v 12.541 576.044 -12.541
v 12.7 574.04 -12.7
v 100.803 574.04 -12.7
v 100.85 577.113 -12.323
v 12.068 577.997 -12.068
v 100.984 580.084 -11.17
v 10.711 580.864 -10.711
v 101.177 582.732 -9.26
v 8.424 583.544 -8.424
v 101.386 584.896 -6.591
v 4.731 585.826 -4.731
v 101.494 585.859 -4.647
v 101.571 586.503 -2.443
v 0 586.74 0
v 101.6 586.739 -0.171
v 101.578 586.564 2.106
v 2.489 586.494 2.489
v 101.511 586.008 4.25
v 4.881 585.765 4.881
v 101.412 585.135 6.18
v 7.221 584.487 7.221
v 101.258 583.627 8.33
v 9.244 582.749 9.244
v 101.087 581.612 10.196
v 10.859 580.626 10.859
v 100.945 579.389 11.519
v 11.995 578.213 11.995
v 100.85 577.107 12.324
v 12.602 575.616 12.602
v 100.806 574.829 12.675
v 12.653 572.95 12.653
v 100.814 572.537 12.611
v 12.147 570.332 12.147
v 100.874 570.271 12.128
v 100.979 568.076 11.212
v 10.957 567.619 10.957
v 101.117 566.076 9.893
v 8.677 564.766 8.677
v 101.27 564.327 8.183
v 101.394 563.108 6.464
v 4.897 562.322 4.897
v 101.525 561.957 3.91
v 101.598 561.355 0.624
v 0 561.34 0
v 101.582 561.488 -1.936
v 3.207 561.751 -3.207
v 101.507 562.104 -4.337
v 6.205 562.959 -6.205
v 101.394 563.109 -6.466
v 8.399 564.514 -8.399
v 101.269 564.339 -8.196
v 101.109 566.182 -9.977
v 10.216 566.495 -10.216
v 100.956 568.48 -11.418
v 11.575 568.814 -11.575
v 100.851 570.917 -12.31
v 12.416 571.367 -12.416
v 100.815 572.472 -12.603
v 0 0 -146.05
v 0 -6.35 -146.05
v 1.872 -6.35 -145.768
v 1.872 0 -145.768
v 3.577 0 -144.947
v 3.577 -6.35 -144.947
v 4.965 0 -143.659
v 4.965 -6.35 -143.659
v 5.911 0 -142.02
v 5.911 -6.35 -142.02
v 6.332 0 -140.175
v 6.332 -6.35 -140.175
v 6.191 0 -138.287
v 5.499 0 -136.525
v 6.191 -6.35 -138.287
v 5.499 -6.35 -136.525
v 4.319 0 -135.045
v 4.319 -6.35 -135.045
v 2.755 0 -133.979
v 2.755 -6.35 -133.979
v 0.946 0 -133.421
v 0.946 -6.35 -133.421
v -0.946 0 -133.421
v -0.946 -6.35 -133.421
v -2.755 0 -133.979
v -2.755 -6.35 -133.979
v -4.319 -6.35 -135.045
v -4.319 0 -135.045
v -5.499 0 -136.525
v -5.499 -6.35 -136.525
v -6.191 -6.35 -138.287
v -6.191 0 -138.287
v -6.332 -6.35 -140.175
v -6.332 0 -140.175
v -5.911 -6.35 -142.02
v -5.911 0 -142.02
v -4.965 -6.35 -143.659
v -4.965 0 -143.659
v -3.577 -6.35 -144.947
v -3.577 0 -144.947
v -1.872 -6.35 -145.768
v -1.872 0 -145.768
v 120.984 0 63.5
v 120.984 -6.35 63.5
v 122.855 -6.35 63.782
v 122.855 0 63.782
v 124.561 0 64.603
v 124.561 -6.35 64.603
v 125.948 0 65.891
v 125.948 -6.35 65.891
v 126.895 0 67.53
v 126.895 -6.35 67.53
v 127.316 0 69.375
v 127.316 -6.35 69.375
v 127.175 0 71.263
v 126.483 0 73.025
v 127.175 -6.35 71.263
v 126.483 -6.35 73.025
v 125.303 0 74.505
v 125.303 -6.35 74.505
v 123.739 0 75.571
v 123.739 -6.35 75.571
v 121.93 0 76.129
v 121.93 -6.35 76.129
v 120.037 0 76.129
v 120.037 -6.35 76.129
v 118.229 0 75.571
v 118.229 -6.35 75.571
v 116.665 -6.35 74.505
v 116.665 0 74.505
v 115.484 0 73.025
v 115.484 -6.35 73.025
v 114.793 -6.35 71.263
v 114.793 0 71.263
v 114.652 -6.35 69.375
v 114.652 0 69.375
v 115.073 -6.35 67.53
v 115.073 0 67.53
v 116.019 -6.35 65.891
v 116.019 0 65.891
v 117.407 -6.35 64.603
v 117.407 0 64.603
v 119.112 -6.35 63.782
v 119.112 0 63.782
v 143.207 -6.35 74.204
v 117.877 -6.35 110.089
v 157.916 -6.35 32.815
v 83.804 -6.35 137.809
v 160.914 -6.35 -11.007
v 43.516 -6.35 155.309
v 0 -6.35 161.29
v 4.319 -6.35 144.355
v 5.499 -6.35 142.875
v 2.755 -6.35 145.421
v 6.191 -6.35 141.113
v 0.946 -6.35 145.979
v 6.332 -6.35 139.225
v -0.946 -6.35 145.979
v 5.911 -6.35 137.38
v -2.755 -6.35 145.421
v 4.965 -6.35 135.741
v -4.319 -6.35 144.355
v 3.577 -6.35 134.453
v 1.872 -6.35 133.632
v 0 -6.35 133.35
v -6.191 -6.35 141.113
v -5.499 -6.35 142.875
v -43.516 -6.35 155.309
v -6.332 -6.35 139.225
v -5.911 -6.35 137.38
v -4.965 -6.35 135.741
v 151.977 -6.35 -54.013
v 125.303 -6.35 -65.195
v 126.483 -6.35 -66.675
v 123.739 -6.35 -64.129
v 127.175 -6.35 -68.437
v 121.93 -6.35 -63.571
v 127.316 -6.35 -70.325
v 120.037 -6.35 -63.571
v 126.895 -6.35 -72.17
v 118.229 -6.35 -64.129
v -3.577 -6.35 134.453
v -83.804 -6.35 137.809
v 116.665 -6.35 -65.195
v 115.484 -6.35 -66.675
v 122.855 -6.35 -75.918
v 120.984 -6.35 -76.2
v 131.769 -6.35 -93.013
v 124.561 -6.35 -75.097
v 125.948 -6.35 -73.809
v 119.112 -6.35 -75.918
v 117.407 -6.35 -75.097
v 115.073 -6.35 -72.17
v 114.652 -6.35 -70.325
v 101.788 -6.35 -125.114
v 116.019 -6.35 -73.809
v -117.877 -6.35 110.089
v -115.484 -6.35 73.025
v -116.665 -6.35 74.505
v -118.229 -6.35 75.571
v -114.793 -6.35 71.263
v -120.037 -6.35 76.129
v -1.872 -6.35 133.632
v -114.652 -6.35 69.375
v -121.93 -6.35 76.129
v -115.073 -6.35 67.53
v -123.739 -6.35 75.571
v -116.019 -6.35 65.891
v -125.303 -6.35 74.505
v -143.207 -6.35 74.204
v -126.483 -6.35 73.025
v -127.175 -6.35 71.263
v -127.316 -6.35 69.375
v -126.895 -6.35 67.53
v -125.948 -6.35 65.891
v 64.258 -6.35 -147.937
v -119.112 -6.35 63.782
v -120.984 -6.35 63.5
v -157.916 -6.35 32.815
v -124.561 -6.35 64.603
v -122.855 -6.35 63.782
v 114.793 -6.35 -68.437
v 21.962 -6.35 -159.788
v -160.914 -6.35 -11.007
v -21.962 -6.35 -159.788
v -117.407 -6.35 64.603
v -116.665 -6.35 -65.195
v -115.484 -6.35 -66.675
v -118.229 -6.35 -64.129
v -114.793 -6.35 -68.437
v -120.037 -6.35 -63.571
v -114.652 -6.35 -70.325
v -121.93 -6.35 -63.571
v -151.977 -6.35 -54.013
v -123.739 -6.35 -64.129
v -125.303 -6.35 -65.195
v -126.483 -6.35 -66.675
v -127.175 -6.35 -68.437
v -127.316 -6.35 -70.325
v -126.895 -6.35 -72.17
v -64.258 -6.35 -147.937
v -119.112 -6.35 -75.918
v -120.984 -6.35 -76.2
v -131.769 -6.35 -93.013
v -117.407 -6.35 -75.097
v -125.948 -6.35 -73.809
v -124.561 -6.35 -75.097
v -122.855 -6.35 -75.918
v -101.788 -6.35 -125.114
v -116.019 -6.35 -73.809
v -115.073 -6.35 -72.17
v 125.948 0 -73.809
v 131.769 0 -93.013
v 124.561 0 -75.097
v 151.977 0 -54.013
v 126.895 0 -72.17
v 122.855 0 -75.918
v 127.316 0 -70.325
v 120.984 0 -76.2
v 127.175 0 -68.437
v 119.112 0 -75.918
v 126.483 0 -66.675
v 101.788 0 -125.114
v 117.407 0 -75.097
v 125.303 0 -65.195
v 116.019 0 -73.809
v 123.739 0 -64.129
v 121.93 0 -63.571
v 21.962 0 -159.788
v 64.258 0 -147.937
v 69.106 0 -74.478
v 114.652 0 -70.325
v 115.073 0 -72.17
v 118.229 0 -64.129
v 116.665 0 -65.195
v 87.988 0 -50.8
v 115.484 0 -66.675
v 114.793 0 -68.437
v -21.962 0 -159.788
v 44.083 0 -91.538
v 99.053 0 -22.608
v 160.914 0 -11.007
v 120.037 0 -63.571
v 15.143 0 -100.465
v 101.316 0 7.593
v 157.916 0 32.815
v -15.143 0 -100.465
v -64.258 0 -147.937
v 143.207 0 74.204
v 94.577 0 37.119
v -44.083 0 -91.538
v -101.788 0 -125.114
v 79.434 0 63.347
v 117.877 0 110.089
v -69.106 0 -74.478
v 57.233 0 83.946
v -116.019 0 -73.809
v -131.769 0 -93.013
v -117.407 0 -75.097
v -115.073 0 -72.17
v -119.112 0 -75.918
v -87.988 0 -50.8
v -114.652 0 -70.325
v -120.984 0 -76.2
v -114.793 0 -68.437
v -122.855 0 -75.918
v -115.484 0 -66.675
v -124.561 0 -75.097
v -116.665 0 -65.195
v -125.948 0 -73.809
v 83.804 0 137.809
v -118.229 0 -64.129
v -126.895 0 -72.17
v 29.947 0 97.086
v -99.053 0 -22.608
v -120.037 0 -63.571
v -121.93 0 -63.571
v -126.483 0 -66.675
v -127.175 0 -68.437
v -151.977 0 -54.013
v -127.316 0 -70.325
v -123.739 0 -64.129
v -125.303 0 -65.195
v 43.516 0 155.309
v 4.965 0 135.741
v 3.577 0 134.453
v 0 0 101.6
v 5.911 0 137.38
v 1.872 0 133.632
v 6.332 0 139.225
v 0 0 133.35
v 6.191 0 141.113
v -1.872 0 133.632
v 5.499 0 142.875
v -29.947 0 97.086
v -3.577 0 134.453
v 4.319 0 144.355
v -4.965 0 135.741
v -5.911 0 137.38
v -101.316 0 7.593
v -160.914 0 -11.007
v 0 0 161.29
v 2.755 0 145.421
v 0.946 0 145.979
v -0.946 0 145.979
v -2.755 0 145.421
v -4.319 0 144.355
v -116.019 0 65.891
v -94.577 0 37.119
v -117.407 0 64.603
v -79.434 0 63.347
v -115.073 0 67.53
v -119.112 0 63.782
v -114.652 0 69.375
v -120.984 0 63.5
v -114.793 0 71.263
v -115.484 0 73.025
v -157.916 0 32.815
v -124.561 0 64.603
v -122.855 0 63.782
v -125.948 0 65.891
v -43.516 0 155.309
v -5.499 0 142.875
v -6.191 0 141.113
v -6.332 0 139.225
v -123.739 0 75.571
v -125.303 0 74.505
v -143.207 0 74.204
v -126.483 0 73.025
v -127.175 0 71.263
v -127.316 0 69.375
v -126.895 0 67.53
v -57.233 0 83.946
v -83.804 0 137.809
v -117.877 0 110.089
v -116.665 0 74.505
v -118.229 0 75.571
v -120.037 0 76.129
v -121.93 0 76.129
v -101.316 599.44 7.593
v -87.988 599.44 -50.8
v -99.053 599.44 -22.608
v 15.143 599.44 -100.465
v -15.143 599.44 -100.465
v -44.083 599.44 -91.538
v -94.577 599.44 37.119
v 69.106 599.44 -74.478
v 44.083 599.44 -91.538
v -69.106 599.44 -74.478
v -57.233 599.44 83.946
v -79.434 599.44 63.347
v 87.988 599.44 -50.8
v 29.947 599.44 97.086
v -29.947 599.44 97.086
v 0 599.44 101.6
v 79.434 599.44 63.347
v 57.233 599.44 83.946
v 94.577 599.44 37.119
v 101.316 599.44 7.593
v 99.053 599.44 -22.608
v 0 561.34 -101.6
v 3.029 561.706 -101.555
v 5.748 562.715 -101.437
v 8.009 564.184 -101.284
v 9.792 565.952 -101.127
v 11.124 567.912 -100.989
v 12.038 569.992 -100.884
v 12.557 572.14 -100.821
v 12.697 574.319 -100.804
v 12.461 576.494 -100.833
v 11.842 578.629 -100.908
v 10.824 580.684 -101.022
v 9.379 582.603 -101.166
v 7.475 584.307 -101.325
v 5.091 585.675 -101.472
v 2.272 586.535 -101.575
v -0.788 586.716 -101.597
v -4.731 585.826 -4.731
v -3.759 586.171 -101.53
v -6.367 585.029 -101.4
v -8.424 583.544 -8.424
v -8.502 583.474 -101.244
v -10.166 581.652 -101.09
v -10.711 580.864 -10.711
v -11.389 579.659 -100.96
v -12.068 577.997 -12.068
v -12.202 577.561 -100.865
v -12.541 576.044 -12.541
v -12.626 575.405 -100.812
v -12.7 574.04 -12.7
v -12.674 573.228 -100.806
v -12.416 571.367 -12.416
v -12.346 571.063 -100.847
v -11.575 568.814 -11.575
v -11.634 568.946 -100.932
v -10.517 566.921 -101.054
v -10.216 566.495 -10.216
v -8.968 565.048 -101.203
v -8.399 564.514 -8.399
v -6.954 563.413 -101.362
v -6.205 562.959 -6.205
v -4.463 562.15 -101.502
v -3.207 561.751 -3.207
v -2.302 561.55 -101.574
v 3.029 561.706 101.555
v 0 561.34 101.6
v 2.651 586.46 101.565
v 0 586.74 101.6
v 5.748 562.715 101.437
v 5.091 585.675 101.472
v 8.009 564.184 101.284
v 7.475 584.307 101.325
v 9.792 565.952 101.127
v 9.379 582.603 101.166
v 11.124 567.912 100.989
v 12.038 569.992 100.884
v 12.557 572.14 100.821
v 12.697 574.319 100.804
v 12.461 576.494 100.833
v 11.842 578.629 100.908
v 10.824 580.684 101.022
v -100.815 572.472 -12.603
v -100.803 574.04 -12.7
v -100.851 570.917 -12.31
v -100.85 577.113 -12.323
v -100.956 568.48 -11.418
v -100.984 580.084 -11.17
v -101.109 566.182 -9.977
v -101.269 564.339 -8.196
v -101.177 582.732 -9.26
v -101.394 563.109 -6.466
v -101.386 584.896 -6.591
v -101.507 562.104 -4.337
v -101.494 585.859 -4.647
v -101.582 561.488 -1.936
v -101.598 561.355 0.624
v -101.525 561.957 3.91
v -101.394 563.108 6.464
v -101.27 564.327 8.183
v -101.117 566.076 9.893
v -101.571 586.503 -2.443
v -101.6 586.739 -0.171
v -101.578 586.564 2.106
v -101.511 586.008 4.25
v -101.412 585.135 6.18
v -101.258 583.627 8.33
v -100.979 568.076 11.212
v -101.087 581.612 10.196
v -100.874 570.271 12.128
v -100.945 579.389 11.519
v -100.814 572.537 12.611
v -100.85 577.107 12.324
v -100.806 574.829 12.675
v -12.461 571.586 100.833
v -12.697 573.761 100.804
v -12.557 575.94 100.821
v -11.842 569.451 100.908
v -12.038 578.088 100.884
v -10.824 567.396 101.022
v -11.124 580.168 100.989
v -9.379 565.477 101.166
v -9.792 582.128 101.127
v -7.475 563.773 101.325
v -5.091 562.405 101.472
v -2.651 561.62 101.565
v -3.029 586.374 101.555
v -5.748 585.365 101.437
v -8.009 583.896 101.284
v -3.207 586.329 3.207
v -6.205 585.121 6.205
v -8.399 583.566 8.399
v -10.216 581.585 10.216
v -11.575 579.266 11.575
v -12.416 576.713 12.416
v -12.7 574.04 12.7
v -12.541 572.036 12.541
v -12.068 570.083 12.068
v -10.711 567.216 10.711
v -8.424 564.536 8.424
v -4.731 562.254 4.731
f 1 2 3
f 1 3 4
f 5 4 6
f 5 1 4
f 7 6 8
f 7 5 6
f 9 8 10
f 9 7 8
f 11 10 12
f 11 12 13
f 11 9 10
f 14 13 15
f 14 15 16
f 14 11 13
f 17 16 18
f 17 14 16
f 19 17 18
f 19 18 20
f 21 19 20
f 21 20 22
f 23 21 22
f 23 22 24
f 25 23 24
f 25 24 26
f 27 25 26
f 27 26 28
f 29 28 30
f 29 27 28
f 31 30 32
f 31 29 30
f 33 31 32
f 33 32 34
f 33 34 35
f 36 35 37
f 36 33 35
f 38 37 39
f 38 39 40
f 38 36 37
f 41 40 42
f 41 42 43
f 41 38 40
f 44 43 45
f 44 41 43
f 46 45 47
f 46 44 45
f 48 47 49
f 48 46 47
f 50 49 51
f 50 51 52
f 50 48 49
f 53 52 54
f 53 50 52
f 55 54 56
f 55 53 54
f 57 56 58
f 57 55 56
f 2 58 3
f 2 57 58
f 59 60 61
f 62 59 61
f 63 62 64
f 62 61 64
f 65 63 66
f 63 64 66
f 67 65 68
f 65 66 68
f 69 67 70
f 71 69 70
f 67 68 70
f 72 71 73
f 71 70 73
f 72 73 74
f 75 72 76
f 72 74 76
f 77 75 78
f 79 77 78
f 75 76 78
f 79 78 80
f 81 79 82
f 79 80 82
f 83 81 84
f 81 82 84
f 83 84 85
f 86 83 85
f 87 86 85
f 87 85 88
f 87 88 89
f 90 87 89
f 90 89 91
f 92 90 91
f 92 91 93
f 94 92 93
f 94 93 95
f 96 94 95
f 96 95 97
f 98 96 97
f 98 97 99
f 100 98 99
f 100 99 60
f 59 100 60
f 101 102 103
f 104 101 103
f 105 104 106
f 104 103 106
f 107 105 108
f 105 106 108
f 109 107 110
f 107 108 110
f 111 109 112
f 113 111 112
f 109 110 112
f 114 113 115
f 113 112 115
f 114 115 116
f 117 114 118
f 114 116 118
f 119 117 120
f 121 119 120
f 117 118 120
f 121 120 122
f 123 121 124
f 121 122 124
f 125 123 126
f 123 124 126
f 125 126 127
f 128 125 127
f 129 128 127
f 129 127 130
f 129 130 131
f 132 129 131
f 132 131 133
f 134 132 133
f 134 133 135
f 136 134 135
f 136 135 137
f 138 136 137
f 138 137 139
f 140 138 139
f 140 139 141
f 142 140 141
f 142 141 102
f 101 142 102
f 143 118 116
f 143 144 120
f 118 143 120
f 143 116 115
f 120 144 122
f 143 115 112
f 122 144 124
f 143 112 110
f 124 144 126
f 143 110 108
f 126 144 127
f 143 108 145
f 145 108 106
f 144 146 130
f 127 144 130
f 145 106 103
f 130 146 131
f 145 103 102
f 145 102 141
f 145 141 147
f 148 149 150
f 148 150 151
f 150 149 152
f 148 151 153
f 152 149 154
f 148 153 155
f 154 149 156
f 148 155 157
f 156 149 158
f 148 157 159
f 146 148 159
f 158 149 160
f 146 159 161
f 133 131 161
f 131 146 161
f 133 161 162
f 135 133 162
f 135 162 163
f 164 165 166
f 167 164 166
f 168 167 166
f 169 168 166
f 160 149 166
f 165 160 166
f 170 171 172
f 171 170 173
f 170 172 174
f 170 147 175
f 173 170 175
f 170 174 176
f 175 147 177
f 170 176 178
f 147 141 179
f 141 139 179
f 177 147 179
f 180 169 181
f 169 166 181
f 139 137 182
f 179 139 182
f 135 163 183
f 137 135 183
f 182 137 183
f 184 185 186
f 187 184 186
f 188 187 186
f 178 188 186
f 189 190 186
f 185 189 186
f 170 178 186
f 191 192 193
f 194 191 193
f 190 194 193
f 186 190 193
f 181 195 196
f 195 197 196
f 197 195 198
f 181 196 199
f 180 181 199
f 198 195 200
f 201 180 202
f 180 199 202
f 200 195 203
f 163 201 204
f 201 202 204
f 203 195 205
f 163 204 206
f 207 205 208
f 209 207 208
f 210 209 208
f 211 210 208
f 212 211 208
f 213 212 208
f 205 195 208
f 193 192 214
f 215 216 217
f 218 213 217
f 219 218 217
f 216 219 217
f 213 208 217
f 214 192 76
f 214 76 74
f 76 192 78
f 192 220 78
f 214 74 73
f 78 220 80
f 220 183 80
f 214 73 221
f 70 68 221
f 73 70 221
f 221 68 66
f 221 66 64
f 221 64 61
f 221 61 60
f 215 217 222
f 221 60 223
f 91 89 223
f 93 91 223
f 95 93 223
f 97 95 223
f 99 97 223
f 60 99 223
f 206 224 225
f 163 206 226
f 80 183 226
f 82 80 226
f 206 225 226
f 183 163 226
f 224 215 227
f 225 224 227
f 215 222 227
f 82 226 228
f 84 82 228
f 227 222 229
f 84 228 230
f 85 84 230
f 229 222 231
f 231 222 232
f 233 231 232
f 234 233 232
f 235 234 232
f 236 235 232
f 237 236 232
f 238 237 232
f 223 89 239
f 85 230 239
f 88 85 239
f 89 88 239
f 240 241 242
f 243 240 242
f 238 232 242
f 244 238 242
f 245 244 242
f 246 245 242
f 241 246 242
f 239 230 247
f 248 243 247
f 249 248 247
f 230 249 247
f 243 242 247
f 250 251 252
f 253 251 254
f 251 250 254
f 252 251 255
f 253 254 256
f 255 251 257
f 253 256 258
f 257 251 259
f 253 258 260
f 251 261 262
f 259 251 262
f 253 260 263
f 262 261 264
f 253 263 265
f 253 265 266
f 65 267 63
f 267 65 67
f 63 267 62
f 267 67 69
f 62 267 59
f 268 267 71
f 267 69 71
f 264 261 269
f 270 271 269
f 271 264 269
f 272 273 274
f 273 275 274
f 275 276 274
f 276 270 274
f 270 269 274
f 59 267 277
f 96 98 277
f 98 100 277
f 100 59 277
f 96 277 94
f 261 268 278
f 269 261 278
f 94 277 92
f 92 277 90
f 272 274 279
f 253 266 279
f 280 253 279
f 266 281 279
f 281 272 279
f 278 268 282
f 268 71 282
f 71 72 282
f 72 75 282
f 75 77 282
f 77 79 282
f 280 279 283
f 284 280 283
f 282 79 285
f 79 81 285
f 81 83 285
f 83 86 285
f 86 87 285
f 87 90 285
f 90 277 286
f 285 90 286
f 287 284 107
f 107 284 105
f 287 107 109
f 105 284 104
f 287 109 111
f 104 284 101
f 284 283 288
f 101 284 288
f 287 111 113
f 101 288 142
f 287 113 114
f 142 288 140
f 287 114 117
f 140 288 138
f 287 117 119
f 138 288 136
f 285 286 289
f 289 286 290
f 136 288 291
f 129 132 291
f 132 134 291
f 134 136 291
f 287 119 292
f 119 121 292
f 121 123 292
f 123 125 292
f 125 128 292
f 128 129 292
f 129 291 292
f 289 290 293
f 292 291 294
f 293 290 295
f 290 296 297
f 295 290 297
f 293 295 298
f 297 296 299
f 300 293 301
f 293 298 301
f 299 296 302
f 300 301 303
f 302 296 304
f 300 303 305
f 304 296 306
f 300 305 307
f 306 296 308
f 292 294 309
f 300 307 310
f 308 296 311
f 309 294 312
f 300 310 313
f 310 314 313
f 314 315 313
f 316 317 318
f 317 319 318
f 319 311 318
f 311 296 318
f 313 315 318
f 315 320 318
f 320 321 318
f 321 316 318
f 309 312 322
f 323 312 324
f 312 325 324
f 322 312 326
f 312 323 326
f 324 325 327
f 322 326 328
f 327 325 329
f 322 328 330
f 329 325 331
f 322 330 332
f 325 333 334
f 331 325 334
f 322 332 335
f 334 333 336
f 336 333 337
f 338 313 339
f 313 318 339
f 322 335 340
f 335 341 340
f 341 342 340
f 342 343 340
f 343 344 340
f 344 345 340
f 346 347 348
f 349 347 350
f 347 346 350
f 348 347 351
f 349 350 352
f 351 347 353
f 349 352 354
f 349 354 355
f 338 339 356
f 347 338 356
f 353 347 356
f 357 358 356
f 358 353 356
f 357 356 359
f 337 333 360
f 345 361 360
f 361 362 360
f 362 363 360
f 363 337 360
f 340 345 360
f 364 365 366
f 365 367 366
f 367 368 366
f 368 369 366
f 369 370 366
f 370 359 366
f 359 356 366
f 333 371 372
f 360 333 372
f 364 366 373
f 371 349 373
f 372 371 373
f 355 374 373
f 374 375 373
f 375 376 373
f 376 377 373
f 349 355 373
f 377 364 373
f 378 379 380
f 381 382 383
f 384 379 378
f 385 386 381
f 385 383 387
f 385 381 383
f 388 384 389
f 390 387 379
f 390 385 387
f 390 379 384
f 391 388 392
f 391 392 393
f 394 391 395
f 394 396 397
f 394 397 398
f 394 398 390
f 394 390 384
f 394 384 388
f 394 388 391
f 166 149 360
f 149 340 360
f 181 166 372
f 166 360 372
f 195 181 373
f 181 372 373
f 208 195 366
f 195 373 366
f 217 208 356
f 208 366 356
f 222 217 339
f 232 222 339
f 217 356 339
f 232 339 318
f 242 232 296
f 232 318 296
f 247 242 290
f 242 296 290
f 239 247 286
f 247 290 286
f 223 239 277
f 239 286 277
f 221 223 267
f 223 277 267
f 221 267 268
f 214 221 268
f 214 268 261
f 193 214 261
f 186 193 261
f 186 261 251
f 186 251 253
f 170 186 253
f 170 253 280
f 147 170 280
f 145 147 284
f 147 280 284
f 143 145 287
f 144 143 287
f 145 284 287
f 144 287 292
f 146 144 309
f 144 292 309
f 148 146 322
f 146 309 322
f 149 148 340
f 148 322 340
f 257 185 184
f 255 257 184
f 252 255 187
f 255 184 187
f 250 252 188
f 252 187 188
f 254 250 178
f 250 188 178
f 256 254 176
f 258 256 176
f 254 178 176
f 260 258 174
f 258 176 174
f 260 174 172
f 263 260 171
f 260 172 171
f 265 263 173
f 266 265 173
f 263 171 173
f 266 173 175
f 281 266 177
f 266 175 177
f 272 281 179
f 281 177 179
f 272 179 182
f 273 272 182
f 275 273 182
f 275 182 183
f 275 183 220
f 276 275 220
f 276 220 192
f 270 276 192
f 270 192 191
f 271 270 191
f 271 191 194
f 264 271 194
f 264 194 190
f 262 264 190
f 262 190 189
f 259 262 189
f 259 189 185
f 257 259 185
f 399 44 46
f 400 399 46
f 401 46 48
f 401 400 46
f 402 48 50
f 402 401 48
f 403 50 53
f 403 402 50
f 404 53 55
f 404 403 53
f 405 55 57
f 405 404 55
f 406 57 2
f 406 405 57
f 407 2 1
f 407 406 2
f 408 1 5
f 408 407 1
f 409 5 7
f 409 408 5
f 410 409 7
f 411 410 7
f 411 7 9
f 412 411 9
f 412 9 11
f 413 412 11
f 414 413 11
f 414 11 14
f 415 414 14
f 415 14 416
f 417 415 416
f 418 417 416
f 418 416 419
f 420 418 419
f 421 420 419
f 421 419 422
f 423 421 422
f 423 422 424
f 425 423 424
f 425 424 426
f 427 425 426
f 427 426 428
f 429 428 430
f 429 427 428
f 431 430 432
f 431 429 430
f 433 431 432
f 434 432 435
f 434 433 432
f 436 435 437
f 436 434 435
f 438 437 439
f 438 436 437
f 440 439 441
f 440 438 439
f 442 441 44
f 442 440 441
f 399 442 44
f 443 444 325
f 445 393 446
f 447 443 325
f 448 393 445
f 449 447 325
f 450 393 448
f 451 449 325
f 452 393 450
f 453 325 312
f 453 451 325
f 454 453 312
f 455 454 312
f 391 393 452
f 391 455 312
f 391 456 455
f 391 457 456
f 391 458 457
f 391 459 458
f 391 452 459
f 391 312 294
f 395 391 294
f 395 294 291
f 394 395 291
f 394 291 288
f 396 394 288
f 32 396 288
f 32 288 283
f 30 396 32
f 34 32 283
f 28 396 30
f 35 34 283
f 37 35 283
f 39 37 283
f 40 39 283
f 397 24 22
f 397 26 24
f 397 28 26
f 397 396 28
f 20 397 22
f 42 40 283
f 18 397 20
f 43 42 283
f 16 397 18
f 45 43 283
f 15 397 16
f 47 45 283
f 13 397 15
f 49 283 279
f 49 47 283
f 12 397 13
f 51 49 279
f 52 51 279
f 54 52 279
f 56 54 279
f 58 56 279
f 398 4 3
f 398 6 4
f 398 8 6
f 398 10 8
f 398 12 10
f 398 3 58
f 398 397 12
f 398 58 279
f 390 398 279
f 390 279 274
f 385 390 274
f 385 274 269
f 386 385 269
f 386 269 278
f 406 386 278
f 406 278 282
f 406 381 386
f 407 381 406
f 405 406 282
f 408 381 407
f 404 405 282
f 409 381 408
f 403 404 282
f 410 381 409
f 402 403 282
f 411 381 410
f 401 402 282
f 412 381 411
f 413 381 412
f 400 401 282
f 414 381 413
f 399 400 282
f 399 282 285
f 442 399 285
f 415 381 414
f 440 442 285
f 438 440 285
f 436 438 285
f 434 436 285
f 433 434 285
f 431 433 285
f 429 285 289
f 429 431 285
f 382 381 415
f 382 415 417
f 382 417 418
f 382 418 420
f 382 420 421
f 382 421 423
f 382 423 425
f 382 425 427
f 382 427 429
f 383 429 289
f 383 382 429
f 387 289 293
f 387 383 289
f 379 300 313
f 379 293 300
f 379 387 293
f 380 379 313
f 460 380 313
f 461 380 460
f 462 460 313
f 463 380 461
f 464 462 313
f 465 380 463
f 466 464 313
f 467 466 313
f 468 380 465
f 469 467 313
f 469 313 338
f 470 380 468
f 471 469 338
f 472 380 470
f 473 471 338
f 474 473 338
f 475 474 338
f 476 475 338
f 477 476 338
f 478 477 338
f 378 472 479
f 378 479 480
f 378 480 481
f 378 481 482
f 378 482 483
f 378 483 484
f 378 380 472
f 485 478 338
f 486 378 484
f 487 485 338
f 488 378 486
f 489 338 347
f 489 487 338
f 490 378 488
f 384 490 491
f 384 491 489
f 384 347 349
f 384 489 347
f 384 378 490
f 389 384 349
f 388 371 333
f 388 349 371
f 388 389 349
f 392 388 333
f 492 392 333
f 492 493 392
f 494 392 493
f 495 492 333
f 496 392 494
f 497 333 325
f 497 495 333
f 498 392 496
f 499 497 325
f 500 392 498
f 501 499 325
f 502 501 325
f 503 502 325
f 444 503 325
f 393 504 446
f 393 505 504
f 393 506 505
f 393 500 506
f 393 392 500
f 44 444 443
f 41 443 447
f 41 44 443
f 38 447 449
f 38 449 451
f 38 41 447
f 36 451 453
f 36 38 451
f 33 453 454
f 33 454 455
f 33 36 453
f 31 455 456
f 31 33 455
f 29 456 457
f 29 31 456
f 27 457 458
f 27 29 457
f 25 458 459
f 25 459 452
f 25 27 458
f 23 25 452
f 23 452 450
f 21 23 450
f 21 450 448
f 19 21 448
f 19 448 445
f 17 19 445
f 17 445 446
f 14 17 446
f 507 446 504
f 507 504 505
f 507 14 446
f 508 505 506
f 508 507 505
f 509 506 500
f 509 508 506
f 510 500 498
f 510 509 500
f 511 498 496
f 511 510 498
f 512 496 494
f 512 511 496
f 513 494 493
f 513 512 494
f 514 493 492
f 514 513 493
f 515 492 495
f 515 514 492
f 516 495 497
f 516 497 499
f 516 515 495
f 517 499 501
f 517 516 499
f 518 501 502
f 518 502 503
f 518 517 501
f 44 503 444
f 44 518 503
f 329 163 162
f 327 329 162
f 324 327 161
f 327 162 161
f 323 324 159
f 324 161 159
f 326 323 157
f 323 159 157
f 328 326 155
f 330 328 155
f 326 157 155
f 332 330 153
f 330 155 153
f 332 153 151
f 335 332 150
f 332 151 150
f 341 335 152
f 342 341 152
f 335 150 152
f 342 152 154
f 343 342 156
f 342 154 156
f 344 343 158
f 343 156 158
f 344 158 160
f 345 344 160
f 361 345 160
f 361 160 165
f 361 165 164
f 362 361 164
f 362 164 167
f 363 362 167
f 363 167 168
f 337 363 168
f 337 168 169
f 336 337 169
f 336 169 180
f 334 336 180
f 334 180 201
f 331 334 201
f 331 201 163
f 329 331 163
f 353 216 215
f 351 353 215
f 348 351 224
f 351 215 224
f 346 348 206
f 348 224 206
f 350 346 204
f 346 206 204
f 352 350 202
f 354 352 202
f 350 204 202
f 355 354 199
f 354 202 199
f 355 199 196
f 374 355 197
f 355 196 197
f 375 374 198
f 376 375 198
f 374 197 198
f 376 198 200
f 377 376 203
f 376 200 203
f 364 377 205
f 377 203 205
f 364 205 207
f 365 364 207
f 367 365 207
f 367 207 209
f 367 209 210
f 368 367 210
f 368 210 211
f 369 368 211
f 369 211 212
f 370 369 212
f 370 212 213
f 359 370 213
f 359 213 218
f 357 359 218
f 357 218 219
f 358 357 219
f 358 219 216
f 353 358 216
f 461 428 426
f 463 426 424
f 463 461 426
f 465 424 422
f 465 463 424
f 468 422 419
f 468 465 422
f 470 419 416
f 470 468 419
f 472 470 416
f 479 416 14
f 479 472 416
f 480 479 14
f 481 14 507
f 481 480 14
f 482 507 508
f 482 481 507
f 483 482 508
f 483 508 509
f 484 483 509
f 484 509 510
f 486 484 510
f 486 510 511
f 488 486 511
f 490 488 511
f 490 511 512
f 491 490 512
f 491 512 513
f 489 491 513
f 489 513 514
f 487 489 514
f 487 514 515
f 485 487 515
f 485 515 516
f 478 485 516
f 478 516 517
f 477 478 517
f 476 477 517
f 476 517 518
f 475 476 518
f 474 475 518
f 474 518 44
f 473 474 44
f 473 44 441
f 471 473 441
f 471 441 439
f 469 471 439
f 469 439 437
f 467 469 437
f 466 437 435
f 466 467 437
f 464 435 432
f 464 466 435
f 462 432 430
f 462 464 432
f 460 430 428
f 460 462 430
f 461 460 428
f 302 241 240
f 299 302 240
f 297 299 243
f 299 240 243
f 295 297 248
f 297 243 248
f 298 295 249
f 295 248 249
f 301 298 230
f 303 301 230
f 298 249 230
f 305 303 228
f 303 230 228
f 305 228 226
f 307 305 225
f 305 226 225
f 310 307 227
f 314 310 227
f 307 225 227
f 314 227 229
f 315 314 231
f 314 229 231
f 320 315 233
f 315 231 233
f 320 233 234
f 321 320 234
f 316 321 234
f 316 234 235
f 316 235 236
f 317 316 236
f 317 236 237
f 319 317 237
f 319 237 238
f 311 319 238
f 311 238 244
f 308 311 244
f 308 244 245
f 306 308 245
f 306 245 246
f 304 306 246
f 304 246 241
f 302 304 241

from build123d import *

# Parameters (mm, degrees)
BOSS_EXTRUDE1_START     = 8.89
SKETCH4_R               = 101.6
BOSS_EXTRUDE1_DEPTH     = 8.89
CUT_EXTRUDE2_DEPTH      = 642.371375881
CUT_EXTRUDE2_DEPTH_BACK = 642.371375881
SKETCH5_R               = 12.7
CUT_EXTRUDE3_DEPTH      = 642.371375975
CUT_EXTRUDE3_DEPTH_BACK = 642.371375975
SKETCH6_R               = 12.7
SKETCH7_R               = 6.35
CUT_EXTRUDE4_DEPTH      = 648.310167092


with BuildPart() as part:
    # Sketch2 → Revolve1 (revolve)
    with BuildSketch(Plane.XY, mode=Mode.PRIVATE) as revolve1_sk:
        Polygon((101.6, 0), (101.6, 590.55), (0, 590.55), (0, 0), (0, -6.35), (161.29, -6.35), (161.29, 0), align=None)
    revolve(revolve1_sk.sketch.rotate(Axis((0, 590.55, 0), (0, -1, 0)), 90), axis=Axis((0, 590.55, 0), (0, -1, 0)))

    # Sketch4 → Boss-Extrude1 (add)
    with BuildSketch(Plane(origin=(0, 590.55, 0), x_dir=(1, 0, 0), z_dir=(0, 1, 0)).offset(BOSS_EXTRUDE1_START)):
        with Locations(Location((0, 0, 0), (0, 0, 270))):
            Circle(SKETCH4_R)
    extrude(amount=-BOSS_EXTRUDE1_DEPTH)

    # Sketch5 → Cut-Extrude2 (cut, two sides: drawn at the far end of the back side and taken through both)
    with BuildSketch(Plane(origin=(0, 0, 0), x_dir=(0, 0, -1), z_dir=(1, 0, 0)).offset(-CUT_EXTRUDE2_DEPTH_BACK)):
        with Locations((0, 574.04)):
            Circle(SKETCH5_R)
    extrude(amount=CUT_EXTRUDE2_DEPTH + CUT_EXTRUDE2_DEPTH_BACK, mode=Mode.SUBTRACT)

    # Sketch6 → Cut-Extrude3 (cut, two sides: drawn at the far end of the back side and taken through both)
    with BuildSketch(Plane.XY.offset(-CUT_EXTRUDE3_DEPTH_BACK)):
        with Locations(Location((0, 574.04, 0), (0, 0, 270))):
            Circle(SKETCH6_R)
    extrude(amount=CUT_EXTRUDE3_DEPTH + CUT_EXTRUDE3_DEPTH_BACK, mode=Mode.SUBTRACT)

    # Sketch7 → Cut-Extrude4 (cut, through all)
    with BuildSketch(Plane.XZ.offset(6.35)):
        with Locations(Location((0, 139.7, 0), (0, 0, 270))):
            Circle(SKETCH7_R)
        with Locations(Location((120.983748909, 69.85, 0), (0, 0, 270))):
            Circle(SKETCH7_R)
        with Locations(Location((120.983748909, -69.85, 0), (0, 0, 270))):
            Circle(SKETCH7_R)
        with Locations(Location((0, -139.7, 0), (0, 0, 270))):
            Circle(SKETCH7_R)
        with Locations(Location((-120.983748909, -69.85, 0), (0, 0, 270))):
            Circle(SKETCH7_R)
        with Locations(Location((-120.983748909, 69.85, 0), (0, 0, 270))):
            Circle(SKETCH7_R)
    extrude(amount=-CUT_EXTRUDE4_DEPTH, mode=Mode.SUBTRACT)


solid = part.part
